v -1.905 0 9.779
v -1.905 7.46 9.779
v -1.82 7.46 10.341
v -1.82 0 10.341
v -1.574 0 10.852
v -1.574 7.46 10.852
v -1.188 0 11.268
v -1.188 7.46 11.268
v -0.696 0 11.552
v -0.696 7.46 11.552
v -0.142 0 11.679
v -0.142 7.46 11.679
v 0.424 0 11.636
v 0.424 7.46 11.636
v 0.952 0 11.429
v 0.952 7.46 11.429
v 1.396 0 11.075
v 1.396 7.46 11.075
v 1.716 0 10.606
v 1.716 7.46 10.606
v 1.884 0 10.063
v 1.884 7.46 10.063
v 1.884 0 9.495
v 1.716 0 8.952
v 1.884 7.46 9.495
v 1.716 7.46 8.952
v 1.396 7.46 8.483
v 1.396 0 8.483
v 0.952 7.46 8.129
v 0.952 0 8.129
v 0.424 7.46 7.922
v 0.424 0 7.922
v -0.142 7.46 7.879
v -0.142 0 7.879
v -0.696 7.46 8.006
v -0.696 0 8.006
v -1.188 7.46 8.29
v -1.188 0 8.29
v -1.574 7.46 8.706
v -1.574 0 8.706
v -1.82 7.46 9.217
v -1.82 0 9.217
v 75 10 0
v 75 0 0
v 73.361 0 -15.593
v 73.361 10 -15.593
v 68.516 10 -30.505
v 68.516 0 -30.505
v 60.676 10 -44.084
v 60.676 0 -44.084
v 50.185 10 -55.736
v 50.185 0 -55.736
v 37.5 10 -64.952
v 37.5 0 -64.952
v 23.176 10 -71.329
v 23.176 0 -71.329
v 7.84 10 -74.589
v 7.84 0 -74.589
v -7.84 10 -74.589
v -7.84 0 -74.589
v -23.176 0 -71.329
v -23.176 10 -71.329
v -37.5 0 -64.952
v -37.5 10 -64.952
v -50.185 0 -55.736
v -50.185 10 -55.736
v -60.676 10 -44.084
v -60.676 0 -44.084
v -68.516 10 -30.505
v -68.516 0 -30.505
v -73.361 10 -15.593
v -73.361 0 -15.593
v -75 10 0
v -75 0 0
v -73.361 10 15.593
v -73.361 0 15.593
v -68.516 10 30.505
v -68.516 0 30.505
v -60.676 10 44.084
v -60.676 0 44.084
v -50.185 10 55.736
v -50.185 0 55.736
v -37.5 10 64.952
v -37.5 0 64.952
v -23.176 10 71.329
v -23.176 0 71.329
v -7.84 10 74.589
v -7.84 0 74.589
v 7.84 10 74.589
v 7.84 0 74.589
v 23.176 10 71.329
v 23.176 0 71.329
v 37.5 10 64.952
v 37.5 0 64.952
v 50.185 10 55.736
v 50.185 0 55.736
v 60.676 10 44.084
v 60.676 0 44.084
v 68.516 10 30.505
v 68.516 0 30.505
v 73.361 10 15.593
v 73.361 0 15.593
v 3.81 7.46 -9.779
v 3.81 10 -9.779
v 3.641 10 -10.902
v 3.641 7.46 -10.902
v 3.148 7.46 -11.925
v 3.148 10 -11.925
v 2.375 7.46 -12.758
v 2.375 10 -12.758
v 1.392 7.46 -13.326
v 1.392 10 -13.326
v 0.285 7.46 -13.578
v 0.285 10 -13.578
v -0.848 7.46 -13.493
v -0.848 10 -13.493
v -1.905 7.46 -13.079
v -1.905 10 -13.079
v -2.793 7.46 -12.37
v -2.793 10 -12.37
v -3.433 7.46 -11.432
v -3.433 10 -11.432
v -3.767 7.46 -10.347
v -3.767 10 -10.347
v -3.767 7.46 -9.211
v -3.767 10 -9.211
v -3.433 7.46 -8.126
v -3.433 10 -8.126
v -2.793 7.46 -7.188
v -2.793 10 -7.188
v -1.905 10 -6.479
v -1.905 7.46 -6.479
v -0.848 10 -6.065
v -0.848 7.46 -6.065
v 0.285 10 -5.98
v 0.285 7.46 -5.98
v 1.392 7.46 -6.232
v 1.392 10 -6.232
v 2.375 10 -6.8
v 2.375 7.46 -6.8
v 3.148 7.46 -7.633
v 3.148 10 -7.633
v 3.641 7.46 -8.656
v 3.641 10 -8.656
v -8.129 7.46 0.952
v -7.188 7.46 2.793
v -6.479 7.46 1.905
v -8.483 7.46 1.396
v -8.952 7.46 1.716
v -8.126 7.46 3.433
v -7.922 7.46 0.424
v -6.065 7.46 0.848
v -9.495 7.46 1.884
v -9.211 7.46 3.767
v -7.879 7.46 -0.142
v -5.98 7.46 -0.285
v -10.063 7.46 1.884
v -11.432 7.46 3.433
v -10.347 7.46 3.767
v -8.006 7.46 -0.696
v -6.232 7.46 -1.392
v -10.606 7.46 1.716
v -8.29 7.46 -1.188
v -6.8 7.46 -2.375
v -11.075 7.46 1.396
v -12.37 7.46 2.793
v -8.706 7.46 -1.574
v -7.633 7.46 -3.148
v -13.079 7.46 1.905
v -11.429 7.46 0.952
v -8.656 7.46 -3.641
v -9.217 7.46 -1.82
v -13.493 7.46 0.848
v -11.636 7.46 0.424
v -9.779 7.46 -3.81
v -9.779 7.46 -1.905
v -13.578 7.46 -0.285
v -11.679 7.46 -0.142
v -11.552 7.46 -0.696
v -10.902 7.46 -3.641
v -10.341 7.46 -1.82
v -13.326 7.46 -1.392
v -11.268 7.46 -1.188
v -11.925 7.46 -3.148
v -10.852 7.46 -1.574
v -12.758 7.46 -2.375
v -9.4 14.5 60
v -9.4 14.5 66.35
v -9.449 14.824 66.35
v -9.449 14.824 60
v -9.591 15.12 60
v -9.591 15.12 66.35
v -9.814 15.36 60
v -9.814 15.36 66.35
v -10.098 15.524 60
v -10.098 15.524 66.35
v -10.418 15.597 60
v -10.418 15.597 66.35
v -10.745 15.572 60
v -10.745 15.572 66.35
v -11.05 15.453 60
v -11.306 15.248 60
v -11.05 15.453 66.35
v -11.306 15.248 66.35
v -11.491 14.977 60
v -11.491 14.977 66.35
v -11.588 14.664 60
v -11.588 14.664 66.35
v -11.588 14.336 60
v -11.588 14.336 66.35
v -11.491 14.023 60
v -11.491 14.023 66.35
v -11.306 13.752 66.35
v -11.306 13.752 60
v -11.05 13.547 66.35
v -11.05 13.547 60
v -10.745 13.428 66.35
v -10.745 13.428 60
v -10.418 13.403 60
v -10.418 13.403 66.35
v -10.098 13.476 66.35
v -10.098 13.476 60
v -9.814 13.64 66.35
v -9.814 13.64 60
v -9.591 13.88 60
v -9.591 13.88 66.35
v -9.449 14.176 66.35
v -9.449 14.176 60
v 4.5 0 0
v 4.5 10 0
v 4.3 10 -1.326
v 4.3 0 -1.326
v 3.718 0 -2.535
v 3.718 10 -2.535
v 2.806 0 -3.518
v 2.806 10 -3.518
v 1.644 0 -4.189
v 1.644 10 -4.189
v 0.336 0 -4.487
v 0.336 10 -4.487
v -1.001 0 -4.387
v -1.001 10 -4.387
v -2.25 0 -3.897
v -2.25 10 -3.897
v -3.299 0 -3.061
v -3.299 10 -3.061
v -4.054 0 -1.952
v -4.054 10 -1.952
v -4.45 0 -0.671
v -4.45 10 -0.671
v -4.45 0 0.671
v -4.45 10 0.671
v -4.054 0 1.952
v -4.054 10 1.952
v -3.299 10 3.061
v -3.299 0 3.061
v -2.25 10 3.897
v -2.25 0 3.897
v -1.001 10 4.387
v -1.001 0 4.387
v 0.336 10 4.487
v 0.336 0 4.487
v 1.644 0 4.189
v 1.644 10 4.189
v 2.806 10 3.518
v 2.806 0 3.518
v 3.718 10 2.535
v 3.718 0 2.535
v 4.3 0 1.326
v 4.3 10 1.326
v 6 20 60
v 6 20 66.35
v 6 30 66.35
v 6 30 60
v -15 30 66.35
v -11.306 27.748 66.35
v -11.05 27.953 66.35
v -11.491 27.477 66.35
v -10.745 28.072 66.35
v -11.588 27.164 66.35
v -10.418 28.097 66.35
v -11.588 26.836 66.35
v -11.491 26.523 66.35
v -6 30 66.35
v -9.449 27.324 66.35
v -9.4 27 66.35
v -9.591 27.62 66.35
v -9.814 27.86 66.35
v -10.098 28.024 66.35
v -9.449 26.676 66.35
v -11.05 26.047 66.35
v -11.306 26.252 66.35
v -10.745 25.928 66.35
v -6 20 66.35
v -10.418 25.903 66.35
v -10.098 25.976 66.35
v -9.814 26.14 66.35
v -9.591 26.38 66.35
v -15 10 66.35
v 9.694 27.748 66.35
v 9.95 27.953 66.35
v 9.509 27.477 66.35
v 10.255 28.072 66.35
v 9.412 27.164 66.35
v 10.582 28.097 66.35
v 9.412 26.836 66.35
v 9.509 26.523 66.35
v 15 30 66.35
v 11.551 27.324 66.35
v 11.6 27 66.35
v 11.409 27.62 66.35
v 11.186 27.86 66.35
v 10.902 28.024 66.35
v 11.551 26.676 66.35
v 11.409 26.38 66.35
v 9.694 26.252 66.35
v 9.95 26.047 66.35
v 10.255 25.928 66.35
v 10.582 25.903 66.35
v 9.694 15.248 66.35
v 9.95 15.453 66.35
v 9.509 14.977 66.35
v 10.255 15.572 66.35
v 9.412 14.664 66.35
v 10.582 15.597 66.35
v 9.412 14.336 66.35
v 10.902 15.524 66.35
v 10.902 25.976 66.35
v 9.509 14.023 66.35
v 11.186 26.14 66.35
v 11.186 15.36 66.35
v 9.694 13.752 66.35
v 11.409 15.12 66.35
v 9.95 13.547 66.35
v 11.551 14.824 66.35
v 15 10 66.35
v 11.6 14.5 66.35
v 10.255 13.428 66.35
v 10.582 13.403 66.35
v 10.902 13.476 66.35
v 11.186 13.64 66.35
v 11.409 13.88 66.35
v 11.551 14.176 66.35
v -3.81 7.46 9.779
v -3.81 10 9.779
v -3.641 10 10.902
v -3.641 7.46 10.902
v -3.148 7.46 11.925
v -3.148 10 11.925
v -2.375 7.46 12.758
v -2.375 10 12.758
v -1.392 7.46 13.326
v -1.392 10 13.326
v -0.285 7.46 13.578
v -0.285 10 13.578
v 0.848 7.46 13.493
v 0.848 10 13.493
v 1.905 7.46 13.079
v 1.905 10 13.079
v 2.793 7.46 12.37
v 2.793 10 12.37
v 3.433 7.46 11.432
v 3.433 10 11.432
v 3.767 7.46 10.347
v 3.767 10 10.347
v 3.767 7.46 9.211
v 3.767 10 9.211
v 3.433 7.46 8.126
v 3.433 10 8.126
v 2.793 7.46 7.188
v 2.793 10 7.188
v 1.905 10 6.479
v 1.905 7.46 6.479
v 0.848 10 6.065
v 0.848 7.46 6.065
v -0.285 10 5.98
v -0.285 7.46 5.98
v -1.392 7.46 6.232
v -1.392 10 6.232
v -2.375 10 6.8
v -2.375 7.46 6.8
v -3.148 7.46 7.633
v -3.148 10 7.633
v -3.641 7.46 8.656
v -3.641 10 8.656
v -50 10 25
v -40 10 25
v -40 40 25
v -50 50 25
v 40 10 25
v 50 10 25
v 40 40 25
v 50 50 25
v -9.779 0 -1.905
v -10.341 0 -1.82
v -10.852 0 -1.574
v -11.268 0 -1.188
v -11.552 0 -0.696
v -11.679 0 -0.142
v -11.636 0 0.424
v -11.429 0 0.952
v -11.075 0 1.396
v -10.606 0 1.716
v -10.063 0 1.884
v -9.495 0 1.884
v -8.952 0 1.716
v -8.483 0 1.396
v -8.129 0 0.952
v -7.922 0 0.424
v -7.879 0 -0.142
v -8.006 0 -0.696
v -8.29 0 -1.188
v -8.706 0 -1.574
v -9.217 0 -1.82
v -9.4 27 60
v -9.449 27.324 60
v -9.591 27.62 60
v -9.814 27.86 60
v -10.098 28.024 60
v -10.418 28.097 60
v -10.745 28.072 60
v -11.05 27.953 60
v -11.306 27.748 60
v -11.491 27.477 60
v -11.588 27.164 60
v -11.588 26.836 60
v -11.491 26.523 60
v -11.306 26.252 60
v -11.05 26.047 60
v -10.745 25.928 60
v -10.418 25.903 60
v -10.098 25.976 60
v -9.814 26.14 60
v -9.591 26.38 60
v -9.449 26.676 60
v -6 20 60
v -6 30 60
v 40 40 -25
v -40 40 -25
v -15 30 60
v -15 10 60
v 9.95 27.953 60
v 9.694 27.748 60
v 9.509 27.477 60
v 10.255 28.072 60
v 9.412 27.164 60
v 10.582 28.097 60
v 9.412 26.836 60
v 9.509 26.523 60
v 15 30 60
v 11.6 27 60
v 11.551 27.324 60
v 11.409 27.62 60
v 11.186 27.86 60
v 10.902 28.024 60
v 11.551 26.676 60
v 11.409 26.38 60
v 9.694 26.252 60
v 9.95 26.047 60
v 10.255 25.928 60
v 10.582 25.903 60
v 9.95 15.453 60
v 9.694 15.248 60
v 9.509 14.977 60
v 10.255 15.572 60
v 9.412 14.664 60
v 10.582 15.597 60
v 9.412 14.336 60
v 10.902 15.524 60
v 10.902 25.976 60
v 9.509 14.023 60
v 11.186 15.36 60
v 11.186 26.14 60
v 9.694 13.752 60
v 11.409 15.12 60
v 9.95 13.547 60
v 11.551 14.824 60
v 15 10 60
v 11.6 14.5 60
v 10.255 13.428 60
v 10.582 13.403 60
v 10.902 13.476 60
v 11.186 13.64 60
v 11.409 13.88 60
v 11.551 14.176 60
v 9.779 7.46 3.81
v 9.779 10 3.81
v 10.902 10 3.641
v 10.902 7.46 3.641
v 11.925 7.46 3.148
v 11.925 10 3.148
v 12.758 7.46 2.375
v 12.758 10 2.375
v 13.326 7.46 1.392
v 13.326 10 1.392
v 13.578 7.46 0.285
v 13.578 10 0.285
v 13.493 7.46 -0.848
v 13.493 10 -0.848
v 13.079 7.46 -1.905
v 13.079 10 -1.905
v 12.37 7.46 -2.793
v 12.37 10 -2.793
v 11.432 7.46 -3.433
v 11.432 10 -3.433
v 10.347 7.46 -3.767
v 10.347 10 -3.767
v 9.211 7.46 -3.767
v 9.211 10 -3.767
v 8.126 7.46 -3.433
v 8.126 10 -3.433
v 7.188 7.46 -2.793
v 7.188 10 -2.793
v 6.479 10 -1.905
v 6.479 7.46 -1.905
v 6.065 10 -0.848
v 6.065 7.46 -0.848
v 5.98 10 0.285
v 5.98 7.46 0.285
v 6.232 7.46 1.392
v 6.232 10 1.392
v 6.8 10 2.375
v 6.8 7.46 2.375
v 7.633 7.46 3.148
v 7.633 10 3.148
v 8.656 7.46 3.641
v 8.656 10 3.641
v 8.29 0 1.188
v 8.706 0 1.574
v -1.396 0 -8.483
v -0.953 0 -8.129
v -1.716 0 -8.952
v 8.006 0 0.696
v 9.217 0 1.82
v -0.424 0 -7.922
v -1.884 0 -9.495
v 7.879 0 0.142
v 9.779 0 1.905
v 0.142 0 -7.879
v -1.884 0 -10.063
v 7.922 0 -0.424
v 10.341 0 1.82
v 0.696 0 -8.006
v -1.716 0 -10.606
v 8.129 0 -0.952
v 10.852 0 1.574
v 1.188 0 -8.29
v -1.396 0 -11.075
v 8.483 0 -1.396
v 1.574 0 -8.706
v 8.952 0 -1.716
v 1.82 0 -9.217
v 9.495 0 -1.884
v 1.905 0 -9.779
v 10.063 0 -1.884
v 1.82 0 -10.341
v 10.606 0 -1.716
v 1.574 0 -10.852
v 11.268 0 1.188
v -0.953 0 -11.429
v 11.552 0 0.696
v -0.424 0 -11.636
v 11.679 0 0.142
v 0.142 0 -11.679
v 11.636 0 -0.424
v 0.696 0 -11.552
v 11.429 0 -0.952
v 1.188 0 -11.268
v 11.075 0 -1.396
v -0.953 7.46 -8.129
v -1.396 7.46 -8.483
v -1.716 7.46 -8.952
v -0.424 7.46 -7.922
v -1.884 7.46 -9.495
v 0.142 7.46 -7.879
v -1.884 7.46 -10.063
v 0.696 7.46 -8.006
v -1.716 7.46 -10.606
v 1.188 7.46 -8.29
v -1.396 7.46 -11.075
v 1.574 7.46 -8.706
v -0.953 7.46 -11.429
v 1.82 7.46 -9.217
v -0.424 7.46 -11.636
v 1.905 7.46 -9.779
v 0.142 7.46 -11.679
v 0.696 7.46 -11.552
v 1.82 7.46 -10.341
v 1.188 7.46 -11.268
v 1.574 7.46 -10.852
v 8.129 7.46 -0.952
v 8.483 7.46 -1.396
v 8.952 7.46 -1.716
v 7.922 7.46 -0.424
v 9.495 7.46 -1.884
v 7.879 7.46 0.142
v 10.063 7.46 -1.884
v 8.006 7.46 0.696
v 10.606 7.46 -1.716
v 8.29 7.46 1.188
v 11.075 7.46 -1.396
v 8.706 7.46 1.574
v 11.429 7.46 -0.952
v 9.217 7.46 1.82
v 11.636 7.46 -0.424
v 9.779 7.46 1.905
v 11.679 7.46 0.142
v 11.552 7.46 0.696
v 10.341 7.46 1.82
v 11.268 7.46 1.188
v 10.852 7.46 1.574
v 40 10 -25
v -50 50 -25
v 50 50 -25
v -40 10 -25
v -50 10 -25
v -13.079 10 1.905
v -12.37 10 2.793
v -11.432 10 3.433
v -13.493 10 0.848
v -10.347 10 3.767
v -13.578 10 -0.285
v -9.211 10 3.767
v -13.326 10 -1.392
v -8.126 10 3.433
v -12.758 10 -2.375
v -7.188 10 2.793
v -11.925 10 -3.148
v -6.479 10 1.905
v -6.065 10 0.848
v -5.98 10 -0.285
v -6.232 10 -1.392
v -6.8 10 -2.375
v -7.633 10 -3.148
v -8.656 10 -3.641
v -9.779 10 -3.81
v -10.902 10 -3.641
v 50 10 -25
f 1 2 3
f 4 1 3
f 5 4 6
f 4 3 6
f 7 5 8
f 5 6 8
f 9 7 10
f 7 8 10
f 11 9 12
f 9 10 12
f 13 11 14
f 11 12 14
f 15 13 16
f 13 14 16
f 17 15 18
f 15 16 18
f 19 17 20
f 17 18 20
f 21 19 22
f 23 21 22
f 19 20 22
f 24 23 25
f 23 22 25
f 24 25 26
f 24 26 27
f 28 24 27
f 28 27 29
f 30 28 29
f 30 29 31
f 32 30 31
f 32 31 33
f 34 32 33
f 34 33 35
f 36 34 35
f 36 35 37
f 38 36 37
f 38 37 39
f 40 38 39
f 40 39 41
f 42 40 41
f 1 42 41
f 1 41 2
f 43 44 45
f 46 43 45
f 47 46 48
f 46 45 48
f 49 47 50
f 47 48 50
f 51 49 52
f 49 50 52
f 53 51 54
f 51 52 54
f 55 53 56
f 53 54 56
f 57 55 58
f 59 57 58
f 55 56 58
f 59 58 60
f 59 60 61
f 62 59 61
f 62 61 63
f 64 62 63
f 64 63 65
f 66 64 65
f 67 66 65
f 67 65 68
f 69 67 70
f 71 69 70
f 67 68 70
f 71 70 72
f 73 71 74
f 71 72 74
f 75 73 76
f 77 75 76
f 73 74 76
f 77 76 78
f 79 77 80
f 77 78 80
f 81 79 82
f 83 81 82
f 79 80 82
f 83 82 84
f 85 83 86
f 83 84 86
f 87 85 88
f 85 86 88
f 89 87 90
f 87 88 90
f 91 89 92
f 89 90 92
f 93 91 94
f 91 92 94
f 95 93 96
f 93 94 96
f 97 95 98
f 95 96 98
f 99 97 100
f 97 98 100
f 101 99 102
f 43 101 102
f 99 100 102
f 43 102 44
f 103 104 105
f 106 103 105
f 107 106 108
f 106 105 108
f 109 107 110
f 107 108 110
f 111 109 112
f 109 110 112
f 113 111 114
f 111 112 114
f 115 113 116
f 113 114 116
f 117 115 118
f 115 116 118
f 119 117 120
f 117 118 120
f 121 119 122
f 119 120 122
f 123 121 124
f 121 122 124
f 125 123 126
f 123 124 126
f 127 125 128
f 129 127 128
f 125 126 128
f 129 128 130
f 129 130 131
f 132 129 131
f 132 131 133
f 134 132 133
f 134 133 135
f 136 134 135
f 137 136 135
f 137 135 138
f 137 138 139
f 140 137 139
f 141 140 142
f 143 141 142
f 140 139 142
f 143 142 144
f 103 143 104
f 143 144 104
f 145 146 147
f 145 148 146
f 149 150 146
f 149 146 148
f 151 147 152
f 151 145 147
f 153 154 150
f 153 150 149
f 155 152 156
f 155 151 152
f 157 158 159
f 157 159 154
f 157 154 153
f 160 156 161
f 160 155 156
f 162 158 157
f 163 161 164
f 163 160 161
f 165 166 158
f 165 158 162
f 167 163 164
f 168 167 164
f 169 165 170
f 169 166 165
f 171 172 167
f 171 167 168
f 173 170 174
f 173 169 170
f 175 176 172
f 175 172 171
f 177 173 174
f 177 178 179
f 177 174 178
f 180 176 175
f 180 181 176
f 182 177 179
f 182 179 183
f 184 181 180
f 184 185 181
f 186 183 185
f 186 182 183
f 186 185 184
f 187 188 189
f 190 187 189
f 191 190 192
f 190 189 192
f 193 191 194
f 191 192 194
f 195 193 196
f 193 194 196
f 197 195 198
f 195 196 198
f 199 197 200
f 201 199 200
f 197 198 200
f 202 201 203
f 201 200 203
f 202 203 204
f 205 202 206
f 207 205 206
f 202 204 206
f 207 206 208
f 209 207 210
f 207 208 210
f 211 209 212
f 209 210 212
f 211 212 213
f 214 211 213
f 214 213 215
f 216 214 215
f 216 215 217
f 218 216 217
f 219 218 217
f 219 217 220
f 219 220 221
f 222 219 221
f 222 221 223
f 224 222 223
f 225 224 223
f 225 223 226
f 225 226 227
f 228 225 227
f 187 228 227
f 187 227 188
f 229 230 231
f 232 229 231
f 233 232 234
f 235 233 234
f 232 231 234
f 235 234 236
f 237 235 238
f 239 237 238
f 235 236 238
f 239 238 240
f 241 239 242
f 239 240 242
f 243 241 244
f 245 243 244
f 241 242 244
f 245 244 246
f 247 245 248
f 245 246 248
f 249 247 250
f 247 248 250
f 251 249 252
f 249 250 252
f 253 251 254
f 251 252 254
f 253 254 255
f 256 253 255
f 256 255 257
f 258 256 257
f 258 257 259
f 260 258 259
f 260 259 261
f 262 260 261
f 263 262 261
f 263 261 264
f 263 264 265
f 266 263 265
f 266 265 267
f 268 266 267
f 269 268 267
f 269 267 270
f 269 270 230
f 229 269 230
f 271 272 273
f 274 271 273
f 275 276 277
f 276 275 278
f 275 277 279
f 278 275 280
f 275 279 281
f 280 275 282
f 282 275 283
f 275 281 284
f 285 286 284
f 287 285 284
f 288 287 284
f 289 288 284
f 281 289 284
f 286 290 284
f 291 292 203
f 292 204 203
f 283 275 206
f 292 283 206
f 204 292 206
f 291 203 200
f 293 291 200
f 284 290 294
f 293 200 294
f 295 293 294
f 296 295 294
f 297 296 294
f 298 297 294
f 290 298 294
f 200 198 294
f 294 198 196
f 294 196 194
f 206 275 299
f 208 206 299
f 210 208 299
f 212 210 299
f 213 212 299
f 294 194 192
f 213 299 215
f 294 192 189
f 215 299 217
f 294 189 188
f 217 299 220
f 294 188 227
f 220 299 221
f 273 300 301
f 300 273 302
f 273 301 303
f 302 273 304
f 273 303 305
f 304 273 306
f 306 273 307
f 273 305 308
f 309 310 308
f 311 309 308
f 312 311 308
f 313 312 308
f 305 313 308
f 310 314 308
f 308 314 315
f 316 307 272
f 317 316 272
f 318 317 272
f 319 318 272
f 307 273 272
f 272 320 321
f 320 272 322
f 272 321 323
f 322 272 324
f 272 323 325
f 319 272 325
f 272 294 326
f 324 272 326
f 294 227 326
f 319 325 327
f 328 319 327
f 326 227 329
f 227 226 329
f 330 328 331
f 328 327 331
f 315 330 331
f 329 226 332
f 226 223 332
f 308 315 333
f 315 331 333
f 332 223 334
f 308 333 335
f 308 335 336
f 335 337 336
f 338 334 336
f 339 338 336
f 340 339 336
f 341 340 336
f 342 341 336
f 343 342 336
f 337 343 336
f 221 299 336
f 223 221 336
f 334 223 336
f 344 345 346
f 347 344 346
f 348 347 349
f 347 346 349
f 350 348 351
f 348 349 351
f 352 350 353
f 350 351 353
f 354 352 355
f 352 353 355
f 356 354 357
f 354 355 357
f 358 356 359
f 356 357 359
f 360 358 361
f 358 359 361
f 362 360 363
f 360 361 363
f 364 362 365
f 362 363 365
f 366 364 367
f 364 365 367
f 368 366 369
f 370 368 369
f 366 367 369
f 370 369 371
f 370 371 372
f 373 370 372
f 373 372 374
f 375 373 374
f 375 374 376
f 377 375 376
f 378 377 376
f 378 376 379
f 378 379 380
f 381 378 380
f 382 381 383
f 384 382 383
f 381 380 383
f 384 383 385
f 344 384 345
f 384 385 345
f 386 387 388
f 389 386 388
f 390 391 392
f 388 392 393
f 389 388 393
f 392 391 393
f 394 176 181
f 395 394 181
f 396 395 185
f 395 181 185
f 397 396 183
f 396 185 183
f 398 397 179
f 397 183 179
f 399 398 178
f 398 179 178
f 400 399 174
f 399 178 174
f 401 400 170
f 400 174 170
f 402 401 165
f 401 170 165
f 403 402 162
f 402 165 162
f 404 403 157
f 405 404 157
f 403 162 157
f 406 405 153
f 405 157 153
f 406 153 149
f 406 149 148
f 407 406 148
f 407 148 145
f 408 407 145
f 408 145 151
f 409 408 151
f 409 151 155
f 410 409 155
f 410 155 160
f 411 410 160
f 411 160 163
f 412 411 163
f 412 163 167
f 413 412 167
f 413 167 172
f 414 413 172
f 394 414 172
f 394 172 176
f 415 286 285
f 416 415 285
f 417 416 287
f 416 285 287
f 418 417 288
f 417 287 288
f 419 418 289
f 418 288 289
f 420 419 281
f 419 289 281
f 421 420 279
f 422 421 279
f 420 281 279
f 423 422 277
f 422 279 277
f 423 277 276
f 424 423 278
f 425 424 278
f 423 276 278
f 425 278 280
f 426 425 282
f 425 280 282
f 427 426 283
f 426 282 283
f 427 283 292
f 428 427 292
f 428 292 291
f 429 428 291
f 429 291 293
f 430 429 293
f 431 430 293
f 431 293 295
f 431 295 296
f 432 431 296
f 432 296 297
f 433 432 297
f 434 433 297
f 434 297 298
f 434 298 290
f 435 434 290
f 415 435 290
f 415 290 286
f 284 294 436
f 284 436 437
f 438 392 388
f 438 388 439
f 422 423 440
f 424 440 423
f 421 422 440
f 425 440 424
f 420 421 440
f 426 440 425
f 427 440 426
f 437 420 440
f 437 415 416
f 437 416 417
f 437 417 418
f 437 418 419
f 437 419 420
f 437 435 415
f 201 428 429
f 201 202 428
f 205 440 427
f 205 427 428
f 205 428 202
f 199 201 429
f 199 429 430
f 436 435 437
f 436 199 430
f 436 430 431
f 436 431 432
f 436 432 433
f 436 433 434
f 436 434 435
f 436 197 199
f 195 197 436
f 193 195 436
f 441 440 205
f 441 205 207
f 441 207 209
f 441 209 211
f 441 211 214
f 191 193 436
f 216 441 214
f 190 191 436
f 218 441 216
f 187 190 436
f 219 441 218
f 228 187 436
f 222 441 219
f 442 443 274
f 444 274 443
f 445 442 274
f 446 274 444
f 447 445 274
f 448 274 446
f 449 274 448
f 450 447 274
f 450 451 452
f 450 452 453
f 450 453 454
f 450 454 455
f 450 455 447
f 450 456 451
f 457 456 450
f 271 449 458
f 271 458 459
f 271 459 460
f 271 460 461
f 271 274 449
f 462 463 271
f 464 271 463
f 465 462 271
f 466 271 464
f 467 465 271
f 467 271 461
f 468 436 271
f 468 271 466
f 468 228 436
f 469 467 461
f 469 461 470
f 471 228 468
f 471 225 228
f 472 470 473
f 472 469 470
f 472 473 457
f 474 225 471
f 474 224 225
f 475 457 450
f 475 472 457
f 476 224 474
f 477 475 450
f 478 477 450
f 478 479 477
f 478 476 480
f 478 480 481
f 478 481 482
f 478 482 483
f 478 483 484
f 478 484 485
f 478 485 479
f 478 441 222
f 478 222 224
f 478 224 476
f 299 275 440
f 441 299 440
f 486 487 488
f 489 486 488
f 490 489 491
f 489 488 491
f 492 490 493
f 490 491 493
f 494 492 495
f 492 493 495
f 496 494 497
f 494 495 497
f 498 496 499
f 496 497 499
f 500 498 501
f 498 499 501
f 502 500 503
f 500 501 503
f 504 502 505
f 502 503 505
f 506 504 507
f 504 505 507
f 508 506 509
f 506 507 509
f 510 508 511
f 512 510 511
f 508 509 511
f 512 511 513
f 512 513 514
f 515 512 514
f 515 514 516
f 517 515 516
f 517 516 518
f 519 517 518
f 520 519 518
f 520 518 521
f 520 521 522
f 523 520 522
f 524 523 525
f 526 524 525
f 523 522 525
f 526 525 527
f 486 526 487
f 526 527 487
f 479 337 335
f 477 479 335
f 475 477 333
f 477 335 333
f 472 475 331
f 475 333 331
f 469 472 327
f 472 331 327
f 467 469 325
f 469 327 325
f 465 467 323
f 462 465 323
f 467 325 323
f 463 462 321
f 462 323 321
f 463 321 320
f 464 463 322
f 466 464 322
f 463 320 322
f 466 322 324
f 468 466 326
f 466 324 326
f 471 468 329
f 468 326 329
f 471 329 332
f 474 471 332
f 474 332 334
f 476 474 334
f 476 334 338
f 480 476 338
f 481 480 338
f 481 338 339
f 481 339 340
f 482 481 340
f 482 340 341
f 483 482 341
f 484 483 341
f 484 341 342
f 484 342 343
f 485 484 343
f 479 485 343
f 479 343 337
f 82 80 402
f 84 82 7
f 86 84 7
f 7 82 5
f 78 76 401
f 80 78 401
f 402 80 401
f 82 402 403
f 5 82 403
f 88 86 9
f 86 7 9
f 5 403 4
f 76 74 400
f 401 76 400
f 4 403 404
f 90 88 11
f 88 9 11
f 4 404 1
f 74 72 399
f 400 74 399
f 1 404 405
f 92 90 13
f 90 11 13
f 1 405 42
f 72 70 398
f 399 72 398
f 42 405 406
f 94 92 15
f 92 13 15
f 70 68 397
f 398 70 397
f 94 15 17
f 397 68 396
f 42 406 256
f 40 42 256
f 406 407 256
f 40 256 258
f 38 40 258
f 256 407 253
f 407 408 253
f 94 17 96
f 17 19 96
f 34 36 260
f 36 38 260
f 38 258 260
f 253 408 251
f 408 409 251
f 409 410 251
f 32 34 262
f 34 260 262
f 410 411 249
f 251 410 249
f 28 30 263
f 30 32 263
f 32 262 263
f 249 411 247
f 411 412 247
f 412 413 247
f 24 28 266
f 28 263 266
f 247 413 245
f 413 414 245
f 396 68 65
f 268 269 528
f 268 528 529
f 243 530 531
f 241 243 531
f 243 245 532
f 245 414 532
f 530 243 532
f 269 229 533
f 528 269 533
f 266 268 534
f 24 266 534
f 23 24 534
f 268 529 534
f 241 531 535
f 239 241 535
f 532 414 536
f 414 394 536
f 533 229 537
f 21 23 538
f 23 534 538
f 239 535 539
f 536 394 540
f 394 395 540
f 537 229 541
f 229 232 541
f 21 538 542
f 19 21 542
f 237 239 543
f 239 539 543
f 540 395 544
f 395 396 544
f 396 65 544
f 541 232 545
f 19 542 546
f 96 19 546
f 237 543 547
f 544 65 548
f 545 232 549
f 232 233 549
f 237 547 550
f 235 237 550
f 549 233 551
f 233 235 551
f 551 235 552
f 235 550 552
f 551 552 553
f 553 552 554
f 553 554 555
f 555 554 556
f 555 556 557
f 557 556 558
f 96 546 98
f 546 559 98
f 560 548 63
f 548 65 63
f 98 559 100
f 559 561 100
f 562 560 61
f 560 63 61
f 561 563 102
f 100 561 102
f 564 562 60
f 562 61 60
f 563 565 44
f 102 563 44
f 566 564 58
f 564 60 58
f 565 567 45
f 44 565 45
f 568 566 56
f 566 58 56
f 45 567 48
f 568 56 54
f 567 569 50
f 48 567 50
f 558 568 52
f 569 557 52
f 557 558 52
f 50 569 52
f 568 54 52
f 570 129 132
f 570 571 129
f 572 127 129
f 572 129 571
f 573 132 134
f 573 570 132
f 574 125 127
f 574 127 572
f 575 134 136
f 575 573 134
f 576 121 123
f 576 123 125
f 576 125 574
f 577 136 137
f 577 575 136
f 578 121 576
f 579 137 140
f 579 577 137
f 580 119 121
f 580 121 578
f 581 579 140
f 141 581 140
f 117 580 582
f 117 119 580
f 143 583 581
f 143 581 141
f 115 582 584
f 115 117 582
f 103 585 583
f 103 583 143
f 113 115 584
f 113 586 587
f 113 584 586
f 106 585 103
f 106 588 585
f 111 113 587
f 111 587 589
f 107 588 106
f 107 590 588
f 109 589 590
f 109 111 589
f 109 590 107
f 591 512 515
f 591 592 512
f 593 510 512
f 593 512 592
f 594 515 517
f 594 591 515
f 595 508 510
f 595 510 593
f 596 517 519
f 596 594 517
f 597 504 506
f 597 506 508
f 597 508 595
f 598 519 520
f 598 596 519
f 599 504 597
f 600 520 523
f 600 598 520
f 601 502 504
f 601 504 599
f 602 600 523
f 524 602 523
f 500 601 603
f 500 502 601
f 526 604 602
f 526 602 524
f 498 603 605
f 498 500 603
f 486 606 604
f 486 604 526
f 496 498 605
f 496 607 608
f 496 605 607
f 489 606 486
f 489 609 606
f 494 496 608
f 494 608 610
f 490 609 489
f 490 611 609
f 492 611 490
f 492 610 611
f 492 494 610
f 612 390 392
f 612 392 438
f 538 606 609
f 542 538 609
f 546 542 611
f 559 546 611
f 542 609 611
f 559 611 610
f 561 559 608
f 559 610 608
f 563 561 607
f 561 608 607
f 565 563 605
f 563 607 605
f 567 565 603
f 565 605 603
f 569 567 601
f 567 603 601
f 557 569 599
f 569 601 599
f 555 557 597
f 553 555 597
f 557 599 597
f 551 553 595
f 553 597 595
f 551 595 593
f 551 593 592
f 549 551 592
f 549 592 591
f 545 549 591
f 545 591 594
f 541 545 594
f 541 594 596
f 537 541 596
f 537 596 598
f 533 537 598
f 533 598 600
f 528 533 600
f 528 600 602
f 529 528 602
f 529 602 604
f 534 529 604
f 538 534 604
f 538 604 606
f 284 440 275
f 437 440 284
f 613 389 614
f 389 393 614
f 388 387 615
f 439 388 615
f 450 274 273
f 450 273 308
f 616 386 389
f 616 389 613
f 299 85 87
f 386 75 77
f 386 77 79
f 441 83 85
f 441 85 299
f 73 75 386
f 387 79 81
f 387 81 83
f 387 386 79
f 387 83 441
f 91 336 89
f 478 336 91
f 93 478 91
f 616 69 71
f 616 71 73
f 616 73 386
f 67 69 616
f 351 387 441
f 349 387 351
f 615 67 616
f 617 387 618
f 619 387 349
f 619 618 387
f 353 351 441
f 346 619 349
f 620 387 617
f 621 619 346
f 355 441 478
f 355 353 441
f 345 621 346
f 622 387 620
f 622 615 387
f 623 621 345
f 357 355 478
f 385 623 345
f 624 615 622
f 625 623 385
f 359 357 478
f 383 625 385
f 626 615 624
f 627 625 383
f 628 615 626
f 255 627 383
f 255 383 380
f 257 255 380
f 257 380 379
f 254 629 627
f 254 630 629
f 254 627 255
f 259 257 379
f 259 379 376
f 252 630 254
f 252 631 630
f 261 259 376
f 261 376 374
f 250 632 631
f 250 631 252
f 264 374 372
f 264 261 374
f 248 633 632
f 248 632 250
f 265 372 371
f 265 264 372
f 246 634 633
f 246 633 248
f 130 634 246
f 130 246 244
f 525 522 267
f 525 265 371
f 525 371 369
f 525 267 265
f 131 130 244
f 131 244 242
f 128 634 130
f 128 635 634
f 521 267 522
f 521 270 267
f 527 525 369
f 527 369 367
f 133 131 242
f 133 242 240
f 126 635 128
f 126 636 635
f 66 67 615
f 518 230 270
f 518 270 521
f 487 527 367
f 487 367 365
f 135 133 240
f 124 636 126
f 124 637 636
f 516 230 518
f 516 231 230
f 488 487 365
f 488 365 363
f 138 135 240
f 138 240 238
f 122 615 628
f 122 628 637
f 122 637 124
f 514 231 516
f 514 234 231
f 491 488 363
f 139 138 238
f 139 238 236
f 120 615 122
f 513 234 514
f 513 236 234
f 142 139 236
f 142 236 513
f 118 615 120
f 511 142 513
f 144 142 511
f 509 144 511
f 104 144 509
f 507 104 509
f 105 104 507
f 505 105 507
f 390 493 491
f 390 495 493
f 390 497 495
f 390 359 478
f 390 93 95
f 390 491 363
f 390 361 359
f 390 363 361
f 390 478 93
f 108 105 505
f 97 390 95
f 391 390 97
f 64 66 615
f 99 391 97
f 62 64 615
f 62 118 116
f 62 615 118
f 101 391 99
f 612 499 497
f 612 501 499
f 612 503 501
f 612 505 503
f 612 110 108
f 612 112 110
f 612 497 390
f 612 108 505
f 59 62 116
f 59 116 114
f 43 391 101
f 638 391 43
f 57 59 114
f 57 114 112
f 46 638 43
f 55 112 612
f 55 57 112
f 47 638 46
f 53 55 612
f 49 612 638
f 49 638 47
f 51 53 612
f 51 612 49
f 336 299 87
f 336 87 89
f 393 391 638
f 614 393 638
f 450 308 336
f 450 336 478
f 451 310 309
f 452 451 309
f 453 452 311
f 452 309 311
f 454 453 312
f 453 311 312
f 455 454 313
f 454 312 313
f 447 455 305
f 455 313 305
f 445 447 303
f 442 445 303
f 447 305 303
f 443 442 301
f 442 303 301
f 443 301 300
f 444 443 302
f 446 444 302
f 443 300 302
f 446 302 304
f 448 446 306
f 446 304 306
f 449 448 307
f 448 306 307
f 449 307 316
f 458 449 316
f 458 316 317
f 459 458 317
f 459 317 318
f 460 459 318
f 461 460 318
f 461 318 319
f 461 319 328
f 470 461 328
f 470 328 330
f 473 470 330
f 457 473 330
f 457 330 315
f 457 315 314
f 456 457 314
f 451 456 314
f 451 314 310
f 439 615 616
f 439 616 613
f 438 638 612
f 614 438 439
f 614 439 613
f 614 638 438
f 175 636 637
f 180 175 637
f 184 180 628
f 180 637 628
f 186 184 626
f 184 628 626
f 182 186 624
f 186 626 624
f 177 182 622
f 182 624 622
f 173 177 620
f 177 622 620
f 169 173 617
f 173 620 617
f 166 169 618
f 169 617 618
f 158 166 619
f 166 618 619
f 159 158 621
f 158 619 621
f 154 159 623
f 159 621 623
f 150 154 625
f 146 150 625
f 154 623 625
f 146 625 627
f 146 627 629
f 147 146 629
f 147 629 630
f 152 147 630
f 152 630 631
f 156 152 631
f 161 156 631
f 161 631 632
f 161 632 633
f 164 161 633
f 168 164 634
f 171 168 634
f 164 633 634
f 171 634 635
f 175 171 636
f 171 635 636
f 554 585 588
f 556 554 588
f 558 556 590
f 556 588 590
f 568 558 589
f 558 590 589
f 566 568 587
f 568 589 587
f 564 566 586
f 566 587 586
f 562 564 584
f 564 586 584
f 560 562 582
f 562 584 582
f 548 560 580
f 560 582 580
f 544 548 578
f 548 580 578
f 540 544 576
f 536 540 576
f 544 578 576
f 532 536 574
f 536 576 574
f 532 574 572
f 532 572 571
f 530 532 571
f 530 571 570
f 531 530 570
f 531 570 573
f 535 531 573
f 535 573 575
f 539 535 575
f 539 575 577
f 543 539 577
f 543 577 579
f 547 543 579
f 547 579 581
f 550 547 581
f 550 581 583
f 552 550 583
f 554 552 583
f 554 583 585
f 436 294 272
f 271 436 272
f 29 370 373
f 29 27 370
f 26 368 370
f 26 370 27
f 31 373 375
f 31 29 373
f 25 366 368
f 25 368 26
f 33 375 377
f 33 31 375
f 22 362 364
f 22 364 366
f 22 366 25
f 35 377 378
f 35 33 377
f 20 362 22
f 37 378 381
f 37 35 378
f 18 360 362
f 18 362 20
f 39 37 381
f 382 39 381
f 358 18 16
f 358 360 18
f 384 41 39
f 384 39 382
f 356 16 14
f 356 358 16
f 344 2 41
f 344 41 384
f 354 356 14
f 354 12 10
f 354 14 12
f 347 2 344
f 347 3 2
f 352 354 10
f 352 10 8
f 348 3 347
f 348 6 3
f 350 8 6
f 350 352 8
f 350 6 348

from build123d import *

# Parameters (mm, degrees)
SKETCH1_R           = 75
BOSS_EXTRUDE1_DEPTH = 10
SKETCH2_R           = 1.905
CUT_EXTRUDE2_DEPTH  = 11
CIRPATTERN1_COUNT   = 4
SKETCH3_R           = 4.5
CUT_EXTRUDE3_DEPTH  = 11
SKETCH4_R           = 3.81
CUT_EXTRUDE4_DEPTH  = 2.54
CIRPATTERN2_COUNT   = 4
SKETCH5_W           = 10
SKETCH5_H           = 50
BOSS_EXTRUDE2_DEPTH = 40
SKETCH6_W           = 50
SKETCH6_H           = 10
BOSS_EXTRUDE3_DEPTH = 40
SKETCH7_W           = 30
SKETCH7_H           = 6.35
BOSS_EXTRUDE4_DEPTH = 20
CUT_EXTRUDE5_REACH  = 143.35
SKETCH8_R           = 1.1
SKETCH8_W           = 12
SKETCH8_H           = 20


with BuildPart() as part:
    # Sketch1 → Boss-Extrude1 (new body)
    with BuildSketch(Plane(origin=(0, 0, 0), x_dir=(1, 0, 0), z_dir=(0, 1, 0))):
        Circle(SKETCH1_R)
    extrude(amount=BOSS_EXTRUDE1_DEPTH)

    # Sketch2 → Cut-Extrude2 (cut, through all)
    with BuildSketch(Plane(origin=(0, 10, 0), x_dir=(1, 0, 0), z_dir=(0, 1, 0))):
        with Locations((0, 9.779)):
            Circle(SKETCH2_R)
    cut_extrude2 = extrude(amount=-CUT_EXTRUDE2_DEPTH, mode=Mode.SUBTRACT)

    # CirPattern1: Cut-Extrude2 ×4 about axis
    cirpattern1_axis = Axis((0, 0, 0), (0, 1, 0))
    for i in range(1, CIRPATTERN1_COUNT):
        add(cut_extrude2.rotate(cirpattern1_axis, i * 360 / CIRPATTERN1_COUNT), mode=Mode.SUBTRACT)

    # Sketch3 → Cut-Extrude3 (cut, through all)
    with BuildSketch(Plane(origin=(0, 10, 0), x_dir=(1, 0, 0), z_dir=(0, 1, 0))):
        Circle(SKETCH3_R)
    extrude(amount=-CUT_EXTRUDE3_DEPTH, mode=Mode.SUBTRACT)

    # Sketch4 → Cut-Extrude4 (cut)
    with BuildSketch(Plane(origin=(0, 10, 0), x_dir=(1, 0, 0), z_dir=(0, 1, 0))):
        with Locations((0, 9.779)):
            Circle(SKETCH4_R)
    cut_extrude4 = extrude(amount=-CUT_EXTRUDE4_DEPTH, mode=Mode.SUBTRACT)

    # CirPattern2: Cut-Extrude4 ×4 about axis
    cirpattern2_axis = Axis((0, 0, 0), (0, 1, 0))
    for i in range(1, CIRPATTERN2_COUNT):
        add(cut_extrude4.rotate(cirpattern2_axis, i * 360 / CIRPATTERN2_COUNT), mode=Mode.SUBTRACT)

    # Sketch5 → Boss-Extrude2 (add)
    with BuildSketch(Plane(origin=(0, 10, 0), x_dir=(1, 0, 0), z_dir=(0, 1, 0))):
        with Locations((-45, 0)):
            Rectangle(SKETCH5_W, SKETCH5_H)
    boss_extrude2 = extrude(amount=BOSS_EXTRUDE2_DEPTH)

    # Sketch6 → Boss-Extrude3 (add)
    with BuildSketch(Plane(origin=(-40, 0, 0), x_dir=(0, 0, -1), z_dir=(1, 0, 0))):
        with Locations((0, 45)):
            Rectangle(SKETCH6_W, SKETCH6_H)
    boss_extrude3 = extrude(amount=BOSS_EXTRUDE3_DEPTH)

    # Mirror1: Boss-Extrude2, Boss-Extrude3 across plane
    add(boss_extrude2.mirror(Plane(origin=(0, 0, 0), x_dir=(0, 0, 1), z_dir=(1, 0, 0))))
    add(boss_extrude3.mirror(Plane(origin=(0, 0, 0), x_dir=(0, 0, 1), z_dir=(1, 0, 0))))

    # Sketch7 → Boss-Extrude4 (add)
    with BuildSketch(Plane(origin=(0, 10, 0), x_dir=(1, 0, 0), z_dir=(0, 1, 0))):
        with Locations((0, -63.175)):
            Rectangle(SKETCH7_W, SKETCH7_H)
    extrude(amount=BOSS_EXTRUDE4_DEPTH)

    # Sketch8 → Cut-Extrude5 (cut, up to next)
    with BuildSketch(Plane.XY.offset(66.35), mode=Mode.PRIVATE) as cut_extrude5_sk1:
        with Locations((-10.5, 27)):
            Circle(SKETCH8_R)
    cut_extrude5_tool1 = extrude(cut_extrude5_sk1.sketch, amount=-CUT_EXTRUDE5_REACH, mode=Mode.PRIVATE) & part.part
    add(cut_extrude5_tool1.solids().sort_by_distance((-10.5, 27, 66.35))[0], mode=Mode.SUBTRACT)
    # Sketch8 → Cut-Extrude5 (cut, up to next)
    with BuildSketch(Plane.XY.offset(66.35), mode=Mode.PRIVATE) as cut_extrude5_sk2:
        with Locations((-10.5, 14.5)):
            Circle(SKETCH8_R)
    cut_extrude5_tool2 = extrude(cut_extrude5_sk2.sketch, amount=-CUT_EXTRUDE5_REACH, mode=Mode.PRIVATE) & part.part
    add(cut_extrude5_tool2.solids().sort_by_distance((-10.5, 14.5, 66.35))[0], mode=Mode.SUBTRACT)
    # Sketch8 → Cut-Extrude5 (cut, up to next)
    with BuildSketch(Plane.XY.offset(66.35), mode=Mode.PRIVATE) as cut_extrude5_sk3:
        with Locations((10.5, 27)):
            Circle(SKETCH8_R)
    cut_extrude5_tool3 = extrude(cut_extrude5_sk3.sketch, amount=-CUT_EXTRUDE5_REACH, mode=Mode.PRIVATE) & part.part
    add(cut_extrude5_tool3.solids().sort_by_distance((10.5, 27, 66.35))[0], mode=Mode.SUBTRACT)
    # Sketch8 → Cut-Extrude5 (cut, up to next)
    with BuildSketch(Plane.XY.offset(66.35), mode=Mode.PRIVATE) as cut_extrude5_sk4:
        with Locations((10.5, 14.5)):
            Circle(SKETCH8_R)
    cut_extrude5_tool4 = extrude(cut_extrude5_sk4.sketch, amount=-CUT_EXTRUDE5_REACH, mode=Mode.PRIVATE) & part.part
    add(cut_extrude5_tool4.solids().sort_by_distance((10.5, 14.5, 66.35))[0], mode=Mode.SUBTRACT)
    # Sketch8 → Cut-Extrude5 (cut, up to next)
    with BuildSketch(Plane.XY.offset(66.35), mode=Mode.PRIVATE) as cut_extrude5_sk5:
        with Locations((0, 30)):
            Rectangle(SKETCH8_W, SKETCH8_H)
    cut_extrude5_tool5 = extrude(cut_extrude5_sk5.sketch, amount=-CUT_EXTRUDE5_REACH, mode=Mode.PRIVATE) & part.part
    add(cut_extrude5_tool5.solids().sort_by_distance((0, 30, 66.35))[0], mode=Mode.SUBTRACT)


solid = part.part
